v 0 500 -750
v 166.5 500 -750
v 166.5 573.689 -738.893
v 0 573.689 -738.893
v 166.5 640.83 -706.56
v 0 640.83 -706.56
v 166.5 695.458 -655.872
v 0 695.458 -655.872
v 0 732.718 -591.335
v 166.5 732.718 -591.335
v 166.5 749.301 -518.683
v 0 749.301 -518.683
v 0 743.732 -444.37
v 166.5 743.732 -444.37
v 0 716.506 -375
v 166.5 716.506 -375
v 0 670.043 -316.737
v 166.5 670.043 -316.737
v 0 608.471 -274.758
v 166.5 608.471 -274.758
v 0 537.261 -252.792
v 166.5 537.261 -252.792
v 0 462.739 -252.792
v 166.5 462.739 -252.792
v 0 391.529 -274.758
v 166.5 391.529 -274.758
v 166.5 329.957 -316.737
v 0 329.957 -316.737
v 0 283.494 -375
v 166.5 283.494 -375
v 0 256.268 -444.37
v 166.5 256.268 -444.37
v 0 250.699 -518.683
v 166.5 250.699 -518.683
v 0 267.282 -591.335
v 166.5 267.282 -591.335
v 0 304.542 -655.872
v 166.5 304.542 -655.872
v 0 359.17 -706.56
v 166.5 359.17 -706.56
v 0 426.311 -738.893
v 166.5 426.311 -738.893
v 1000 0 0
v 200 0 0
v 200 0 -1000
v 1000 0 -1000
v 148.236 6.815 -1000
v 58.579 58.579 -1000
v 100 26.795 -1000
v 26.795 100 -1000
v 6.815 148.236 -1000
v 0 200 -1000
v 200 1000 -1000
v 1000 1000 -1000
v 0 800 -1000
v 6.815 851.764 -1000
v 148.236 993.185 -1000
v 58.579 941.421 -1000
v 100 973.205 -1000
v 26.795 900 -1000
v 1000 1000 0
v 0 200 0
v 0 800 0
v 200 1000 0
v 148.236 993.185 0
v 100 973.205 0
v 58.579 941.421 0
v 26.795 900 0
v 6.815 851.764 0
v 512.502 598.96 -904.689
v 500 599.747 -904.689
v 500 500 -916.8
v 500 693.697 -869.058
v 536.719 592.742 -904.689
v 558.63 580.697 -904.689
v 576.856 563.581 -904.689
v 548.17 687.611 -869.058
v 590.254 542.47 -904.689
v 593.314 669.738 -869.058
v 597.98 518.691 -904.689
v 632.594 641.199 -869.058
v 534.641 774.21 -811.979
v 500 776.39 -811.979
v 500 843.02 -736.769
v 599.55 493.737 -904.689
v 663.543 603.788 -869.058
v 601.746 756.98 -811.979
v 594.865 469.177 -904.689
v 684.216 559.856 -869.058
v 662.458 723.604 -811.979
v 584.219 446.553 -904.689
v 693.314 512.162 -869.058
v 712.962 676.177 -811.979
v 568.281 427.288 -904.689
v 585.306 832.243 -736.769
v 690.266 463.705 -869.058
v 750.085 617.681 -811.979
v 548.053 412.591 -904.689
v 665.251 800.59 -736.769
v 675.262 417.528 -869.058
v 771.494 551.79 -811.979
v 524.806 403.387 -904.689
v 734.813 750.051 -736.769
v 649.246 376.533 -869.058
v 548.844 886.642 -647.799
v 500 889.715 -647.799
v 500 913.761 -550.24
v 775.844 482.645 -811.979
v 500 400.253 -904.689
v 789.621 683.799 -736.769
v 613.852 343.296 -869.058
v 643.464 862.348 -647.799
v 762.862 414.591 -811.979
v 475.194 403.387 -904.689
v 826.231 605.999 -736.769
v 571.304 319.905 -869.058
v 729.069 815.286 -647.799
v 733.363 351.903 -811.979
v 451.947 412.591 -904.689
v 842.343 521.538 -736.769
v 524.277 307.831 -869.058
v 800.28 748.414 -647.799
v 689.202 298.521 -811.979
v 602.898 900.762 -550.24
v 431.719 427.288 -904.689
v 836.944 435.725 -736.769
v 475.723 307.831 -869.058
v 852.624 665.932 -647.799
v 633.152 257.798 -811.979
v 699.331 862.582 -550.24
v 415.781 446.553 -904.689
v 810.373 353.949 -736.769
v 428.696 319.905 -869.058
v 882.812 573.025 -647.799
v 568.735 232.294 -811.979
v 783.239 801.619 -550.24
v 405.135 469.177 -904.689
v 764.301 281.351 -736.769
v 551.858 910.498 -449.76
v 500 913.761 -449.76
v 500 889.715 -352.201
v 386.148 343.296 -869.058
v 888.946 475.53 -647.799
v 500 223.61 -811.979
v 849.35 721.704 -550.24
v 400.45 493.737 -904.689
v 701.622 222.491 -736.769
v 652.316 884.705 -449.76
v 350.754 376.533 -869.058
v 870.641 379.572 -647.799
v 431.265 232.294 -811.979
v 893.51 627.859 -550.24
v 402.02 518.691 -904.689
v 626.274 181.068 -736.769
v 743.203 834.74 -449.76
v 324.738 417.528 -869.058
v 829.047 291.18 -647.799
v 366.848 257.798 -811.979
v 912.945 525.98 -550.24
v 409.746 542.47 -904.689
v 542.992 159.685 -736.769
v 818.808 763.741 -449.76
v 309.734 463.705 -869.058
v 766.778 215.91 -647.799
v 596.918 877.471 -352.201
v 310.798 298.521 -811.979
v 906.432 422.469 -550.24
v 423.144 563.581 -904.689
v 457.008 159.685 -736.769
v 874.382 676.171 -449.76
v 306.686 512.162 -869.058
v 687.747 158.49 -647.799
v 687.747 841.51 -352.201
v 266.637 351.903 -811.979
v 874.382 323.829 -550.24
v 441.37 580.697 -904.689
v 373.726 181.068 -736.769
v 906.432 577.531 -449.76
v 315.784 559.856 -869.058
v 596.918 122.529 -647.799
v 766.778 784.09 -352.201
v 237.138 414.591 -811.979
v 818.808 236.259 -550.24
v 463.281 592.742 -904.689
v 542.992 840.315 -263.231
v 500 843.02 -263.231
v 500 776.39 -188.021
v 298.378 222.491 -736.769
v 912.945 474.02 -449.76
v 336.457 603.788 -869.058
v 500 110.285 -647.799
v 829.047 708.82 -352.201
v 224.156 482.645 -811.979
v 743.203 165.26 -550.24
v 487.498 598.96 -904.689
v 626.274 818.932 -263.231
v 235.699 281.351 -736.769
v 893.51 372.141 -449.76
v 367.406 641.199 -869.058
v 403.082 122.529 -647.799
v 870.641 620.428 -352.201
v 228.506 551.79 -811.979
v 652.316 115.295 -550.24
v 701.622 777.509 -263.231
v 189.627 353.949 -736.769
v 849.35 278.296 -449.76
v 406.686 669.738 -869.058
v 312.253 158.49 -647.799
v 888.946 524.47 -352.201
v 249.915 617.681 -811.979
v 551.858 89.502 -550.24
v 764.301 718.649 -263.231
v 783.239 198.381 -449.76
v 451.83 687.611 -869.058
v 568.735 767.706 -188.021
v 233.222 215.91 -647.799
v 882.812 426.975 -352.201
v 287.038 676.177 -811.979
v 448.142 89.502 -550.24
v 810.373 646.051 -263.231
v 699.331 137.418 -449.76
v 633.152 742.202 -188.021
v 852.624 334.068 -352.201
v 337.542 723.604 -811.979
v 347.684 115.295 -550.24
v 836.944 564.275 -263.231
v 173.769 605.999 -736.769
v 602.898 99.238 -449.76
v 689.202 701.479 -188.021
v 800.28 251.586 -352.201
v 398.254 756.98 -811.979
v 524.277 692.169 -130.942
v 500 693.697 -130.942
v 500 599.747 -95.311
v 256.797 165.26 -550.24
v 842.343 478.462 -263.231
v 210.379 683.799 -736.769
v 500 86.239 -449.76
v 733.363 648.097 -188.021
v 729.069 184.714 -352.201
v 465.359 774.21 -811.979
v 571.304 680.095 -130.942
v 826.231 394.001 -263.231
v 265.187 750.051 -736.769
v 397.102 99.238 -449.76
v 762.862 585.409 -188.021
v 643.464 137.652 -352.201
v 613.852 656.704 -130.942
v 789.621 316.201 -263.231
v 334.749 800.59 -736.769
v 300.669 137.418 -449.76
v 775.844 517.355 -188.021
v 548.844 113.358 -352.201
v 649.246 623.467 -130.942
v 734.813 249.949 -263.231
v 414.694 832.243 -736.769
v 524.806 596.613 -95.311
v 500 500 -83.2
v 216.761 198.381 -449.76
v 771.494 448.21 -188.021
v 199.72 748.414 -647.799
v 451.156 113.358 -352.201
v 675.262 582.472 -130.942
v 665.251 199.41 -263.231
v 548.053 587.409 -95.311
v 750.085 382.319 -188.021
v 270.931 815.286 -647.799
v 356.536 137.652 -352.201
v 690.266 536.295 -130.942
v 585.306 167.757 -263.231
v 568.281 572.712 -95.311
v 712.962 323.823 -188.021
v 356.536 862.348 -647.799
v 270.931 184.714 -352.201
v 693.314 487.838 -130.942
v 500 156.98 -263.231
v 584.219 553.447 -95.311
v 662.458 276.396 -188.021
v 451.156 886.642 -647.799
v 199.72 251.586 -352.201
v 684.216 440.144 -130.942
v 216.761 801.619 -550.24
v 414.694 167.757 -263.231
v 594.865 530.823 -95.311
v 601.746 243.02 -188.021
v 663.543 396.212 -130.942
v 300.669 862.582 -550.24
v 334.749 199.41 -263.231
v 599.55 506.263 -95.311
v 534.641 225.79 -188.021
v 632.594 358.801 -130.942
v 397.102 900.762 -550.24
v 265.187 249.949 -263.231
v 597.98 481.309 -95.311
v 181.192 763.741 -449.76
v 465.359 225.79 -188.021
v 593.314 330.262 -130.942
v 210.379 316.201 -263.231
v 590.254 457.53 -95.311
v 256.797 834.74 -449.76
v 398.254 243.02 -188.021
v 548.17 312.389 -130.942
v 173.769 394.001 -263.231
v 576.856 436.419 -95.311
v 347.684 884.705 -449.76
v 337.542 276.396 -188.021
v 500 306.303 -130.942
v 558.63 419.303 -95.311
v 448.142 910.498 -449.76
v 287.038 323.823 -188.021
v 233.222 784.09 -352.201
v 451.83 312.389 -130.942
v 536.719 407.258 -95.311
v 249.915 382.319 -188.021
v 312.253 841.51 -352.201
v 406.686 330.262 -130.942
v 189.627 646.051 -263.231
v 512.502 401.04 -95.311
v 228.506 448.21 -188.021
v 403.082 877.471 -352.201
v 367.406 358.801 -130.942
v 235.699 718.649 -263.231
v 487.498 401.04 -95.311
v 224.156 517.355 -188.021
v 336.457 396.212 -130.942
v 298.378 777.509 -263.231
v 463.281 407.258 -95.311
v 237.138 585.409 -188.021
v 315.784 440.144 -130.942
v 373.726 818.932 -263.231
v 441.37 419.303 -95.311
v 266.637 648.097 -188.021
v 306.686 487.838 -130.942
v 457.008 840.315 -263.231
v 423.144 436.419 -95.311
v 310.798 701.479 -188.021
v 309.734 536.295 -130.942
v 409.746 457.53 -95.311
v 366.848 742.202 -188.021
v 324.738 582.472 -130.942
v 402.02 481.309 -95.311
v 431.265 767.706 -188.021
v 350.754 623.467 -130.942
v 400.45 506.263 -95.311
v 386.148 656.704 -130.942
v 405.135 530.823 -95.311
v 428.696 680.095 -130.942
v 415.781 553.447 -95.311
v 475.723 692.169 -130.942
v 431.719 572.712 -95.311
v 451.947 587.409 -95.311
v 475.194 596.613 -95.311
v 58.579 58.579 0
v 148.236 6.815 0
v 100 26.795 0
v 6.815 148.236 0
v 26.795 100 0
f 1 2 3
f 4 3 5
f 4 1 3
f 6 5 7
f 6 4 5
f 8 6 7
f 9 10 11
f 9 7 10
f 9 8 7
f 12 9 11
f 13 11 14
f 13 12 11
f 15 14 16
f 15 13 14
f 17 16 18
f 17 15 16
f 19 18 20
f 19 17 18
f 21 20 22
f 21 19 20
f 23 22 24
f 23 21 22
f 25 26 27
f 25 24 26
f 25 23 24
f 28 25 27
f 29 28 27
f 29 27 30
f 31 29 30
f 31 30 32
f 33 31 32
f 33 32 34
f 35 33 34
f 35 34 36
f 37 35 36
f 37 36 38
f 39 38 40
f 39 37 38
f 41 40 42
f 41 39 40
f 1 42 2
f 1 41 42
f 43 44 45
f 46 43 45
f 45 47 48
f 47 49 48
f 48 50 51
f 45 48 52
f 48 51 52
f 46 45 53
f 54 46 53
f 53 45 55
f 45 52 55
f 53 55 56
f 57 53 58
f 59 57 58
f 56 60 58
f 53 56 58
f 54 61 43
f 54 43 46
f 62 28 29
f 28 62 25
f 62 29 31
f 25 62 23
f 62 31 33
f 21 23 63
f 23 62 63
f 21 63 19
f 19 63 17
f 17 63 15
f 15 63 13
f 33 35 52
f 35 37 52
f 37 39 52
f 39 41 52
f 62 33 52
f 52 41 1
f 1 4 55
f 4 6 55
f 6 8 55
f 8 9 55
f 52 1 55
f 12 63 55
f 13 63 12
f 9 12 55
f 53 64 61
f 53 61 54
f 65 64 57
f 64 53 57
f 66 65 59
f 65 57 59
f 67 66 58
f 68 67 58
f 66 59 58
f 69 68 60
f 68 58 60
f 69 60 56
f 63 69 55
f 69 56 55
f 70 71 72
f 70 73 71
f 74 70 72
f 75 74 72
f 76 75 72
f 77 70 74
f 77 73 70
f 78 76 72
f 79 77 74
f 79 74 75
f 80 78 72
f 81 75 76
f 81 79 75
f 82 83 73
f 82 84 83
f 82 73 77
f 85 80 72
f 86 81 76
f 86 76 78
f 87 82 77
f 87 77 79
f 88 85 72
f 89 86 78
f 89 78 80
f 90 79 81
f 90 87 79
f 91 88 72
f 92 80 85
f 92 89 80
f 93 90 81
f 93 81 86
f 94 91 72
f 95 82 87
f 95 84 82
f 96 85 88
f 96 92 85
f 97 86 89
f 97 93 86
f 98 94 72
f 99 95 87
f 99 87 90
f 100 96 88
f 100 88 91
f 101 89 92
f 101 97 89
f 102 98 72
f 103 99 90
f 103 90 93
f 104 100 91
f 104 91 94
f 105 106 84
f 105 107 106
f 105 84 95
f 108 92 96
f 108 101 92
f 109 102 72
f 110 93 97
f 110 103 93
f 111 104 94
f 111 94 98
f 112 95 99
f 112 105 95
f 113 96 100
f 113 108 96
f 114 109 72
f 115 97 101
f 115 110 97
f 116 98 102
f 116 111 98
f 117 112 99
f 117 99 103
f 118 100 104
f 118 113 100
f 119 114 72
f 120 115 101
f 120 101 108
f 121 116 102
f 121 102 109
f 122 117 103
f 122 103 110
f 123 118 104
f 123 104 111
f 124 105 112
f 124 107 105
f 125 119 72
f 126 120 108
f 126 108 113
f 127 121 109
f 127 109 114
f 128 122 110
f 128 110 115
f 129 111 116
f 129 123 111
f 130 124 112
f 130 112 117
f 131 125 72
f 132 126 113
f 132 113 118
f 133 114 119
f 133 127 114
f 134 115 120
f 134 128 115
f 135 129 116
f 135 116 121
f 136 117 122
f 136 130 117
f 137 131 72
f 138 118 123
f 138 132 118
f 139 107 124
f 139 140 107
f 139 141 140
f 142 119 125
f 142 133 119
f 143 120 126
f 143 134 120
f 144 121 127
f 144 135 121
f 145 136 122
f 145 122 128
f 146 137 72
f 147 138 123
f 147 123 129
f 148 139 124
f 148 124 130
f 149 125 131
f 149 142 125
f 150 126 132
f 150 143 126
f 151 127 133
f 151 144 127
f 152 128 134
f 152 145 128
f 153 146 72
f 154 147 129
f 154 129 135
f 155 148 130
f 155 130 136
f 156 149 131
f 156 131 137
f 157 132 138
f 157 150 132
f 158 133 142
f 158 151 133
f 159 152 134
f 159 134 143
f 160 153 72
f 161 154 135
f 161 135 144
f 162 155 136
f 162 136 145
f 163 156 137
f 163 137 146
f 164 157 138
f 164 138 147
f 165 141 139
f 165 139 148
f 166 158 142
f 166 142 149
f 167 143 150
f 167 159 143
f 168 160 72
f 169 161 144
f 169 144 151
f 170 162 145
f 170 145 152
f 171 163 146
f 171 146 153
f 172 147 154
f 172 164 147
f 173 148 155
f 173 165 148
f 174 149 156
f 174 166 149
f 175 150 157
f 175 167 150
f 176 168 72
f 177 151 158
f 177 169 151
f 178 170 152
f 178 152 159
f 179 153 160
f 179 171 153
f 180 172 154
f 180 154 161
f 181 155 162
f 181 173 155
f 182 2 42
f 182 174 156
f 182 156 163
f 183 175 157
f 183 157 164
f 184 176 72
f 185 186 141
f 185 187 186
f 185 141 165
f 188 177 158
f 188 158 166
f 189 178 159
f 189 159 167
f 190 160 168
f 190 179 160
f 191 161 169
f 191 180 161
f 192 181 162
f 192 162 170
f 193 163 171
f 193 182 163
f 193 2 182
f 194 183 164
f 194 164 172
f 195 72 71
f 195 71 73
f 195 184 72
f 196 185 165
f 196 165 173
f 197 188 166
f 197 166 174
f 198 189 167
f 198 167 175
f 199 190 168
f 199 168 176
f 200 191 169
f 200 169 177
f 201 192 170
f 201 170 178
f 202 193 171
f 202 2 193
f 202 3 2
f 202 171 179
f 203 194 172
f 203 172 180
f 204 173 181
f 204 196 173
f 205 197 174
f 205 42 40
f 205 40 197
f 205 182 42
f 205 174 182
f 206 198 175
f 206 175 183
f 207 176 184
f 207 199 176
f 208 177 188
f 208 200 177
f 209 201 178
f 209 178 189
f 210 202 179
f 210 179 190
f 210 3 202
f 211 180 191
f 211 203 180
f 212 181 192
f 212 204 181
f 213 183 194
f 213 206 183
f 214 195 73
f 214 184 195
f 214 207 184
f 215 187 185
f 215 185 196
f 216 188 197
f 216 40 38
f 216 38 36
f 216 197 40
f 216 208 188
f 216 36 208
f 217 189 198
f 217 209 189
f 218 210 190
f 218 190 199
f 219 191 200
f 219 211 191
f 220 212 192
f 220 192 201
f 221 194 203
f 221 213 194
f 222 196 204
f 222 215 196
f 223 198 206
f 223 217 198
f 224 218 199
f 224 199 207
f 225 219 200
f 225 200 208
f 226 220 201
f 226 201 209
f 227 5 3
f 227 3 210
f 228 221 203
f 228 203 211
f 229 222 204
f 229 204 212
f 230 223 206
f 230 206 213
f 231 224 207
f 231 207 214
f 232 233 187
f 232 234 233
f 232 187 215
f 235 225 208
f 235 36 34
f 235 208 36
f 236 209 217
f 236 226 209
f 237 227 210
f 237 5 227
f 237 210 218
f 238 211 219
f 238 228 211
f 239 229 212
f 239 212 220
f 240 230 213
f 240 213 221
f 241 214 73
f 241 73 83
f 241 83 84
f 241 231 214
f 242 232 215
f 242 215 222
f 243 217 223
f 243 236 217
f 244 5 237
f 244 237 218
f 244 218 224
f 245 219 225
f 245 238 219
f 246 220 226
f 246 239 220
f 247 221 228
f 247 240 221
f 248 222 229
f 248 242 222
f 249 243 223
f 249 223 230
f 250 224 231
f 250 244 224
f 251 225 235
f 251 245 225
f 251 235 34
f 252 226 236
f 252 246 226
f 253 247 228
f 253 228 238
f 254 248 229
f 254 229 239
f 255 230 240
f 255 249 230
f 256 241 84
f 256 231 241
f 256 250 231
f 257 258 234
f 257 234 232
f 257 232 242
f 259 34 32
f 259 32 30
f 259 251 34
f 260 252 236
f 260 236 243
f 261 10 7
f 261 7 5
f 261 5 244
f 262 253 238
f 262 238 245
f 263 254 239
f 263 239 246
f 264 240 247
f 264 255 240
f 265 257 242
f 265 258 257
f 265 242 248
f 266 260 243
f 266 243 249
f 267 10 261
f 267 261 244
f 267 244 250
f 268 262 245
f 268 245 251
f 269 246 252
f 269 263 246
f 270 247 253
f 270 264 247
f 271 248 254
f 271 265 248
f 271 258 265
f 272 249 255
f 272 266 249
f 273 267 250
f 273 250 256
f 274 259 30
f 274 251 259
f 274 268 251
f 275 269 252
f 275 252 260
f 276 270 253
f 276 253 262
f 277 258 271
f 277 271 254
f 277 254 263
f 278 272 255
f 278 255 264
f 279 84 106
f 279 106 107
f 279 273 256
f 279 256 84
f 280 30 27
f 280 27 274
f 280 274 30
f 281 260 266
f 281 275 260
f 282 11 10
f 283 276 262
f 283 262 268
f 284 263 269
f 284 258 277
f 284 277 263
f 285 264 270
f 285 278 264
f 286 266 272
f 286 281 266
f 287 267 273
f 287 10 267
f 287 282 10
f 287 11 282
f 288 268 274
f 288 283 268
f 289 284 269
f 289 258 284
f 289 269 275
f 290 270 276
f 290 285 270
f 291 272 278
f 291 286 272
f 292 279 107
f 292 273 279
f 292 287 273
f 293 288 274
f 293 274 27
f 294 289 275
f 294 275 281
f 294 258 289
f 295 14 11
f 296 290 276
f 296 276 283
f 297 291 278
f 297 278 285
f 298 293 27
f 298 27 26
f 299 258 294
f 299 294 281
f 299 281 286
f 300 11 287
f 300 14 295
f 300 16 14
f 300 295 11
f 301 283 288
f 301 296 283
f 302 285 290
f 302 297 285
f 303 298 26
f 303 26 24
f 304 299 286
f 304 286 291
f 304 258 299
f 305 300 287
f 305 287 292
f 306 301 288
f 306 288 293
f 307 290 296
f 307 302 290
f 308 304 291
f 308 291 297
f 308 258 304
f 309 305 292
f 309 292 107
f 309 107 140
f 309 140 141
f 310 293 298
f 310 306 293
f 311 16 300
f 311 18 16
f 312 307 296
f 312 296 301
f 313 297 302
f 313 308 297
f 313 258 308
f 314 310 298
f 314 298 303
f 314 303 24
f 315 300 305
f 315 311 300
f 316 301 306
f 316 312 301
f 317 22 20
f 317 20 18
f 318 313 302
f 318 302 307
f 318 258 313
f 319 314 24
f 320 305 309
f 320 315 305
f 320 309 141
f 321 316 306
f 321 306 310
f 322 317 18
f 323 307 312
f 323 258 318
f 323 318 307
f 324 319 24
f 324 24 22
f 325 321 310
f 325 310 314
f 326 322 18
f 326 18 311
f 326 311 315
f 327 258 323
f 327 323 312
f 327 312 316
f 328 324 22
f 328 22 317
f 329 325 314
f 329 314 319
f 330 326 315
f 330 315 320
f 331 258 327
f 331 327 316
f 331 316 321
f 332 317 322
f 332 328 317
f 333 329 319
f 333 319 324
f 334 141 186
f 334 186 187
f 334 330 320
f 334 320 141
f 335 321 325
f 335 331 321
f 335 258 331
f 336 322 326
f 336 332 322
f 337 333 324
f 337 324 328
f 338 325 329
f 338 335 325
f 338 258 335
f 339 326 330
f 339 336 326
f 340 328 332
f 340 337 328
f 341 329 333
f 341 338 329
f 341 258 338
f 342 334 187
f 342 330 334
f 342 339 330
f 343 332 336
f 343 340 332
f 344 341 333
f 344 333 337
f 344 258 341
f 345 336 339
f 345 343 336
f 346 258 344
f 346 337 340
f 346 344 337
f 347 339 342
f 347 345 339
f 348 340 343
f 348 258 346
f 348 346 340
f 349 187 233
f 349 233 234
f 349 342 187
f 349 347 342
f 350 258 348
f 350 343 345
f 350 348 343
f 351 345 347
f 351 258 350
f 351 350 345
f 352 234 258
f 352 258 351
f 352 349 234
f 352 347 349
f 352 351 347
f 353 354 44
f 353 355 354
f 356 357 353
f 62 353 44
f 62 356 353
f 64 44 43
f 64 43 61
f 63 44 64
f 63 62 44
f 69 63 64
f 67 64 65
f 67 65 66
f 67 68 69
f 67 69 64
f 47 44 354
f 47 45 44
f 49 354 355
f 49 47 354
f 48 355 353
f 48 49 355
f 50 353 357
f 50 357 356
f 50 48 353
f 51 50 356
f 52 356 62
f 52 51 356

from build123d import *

# Parameters (mm, degrees)
SKETCH5_W           = 1000
SKETCH5_H           = 1000
BOSS_EXTRUDE2_DEPTH = 1000
SKETCH7_R           = 250
CUT_EXTRUDE2_DEPTH  = 400
FILLET1_R           = 200


with BuildPart() as part:
    # Sketch5 → Boss-Extrude2 (new body)
    with BuildSketch(Plane(origin=(0, 0, 0), x_dir=(0, 0, -1), z_dir=(1, 0, 0))):
        with Locations((500, 500)):
            Rectangle(SKETCH5_W, SKETCH5_H)
    extrude(amount=BOSS_EXTRUDE2_DEPTH)

    # Sketch6 → Cut-Revolve5 (revolve, cut)
    with BuildSketch(Plane(origin=(500, 0, 0), x_dir=(0, 0, -1), z_dir=(1, 0, 0))):
        with BuildLine():
            Line((83.20002133, 500), (916.79997867, 500))
            ThreePointArc((916.79997867, 500), (500, 916.79997867), (83.20002133, 500))
        make_face()
    revolve(axis=Axis((500, 500, -83.20002133), (0, 0, -1)), mode=Mode.SUBTRACT)

    # Sketch7 → Cut-Extrude2 (cut)
    with BuildSketch(Plane(origin=(0, 0, 0), x_dir=(0, 0, -1), z_dir=(1, 0, 0))):
        with Locations((500, 500)):
            Circle(SKETCH7_R)
    extrude(amount=CUT_EXTRUDE2_DEPTH, mode=Mode.SUBTRACT)

    # Fillet1
    fillet1_edges = [part.edges().sort_by_distance(p)[0] for p in [
        (0, 1000, -500),
        (0, 0, -500),
    ]]
    fillet(fillet1_edges, radius=FILLET1_R)


solid = part.part
